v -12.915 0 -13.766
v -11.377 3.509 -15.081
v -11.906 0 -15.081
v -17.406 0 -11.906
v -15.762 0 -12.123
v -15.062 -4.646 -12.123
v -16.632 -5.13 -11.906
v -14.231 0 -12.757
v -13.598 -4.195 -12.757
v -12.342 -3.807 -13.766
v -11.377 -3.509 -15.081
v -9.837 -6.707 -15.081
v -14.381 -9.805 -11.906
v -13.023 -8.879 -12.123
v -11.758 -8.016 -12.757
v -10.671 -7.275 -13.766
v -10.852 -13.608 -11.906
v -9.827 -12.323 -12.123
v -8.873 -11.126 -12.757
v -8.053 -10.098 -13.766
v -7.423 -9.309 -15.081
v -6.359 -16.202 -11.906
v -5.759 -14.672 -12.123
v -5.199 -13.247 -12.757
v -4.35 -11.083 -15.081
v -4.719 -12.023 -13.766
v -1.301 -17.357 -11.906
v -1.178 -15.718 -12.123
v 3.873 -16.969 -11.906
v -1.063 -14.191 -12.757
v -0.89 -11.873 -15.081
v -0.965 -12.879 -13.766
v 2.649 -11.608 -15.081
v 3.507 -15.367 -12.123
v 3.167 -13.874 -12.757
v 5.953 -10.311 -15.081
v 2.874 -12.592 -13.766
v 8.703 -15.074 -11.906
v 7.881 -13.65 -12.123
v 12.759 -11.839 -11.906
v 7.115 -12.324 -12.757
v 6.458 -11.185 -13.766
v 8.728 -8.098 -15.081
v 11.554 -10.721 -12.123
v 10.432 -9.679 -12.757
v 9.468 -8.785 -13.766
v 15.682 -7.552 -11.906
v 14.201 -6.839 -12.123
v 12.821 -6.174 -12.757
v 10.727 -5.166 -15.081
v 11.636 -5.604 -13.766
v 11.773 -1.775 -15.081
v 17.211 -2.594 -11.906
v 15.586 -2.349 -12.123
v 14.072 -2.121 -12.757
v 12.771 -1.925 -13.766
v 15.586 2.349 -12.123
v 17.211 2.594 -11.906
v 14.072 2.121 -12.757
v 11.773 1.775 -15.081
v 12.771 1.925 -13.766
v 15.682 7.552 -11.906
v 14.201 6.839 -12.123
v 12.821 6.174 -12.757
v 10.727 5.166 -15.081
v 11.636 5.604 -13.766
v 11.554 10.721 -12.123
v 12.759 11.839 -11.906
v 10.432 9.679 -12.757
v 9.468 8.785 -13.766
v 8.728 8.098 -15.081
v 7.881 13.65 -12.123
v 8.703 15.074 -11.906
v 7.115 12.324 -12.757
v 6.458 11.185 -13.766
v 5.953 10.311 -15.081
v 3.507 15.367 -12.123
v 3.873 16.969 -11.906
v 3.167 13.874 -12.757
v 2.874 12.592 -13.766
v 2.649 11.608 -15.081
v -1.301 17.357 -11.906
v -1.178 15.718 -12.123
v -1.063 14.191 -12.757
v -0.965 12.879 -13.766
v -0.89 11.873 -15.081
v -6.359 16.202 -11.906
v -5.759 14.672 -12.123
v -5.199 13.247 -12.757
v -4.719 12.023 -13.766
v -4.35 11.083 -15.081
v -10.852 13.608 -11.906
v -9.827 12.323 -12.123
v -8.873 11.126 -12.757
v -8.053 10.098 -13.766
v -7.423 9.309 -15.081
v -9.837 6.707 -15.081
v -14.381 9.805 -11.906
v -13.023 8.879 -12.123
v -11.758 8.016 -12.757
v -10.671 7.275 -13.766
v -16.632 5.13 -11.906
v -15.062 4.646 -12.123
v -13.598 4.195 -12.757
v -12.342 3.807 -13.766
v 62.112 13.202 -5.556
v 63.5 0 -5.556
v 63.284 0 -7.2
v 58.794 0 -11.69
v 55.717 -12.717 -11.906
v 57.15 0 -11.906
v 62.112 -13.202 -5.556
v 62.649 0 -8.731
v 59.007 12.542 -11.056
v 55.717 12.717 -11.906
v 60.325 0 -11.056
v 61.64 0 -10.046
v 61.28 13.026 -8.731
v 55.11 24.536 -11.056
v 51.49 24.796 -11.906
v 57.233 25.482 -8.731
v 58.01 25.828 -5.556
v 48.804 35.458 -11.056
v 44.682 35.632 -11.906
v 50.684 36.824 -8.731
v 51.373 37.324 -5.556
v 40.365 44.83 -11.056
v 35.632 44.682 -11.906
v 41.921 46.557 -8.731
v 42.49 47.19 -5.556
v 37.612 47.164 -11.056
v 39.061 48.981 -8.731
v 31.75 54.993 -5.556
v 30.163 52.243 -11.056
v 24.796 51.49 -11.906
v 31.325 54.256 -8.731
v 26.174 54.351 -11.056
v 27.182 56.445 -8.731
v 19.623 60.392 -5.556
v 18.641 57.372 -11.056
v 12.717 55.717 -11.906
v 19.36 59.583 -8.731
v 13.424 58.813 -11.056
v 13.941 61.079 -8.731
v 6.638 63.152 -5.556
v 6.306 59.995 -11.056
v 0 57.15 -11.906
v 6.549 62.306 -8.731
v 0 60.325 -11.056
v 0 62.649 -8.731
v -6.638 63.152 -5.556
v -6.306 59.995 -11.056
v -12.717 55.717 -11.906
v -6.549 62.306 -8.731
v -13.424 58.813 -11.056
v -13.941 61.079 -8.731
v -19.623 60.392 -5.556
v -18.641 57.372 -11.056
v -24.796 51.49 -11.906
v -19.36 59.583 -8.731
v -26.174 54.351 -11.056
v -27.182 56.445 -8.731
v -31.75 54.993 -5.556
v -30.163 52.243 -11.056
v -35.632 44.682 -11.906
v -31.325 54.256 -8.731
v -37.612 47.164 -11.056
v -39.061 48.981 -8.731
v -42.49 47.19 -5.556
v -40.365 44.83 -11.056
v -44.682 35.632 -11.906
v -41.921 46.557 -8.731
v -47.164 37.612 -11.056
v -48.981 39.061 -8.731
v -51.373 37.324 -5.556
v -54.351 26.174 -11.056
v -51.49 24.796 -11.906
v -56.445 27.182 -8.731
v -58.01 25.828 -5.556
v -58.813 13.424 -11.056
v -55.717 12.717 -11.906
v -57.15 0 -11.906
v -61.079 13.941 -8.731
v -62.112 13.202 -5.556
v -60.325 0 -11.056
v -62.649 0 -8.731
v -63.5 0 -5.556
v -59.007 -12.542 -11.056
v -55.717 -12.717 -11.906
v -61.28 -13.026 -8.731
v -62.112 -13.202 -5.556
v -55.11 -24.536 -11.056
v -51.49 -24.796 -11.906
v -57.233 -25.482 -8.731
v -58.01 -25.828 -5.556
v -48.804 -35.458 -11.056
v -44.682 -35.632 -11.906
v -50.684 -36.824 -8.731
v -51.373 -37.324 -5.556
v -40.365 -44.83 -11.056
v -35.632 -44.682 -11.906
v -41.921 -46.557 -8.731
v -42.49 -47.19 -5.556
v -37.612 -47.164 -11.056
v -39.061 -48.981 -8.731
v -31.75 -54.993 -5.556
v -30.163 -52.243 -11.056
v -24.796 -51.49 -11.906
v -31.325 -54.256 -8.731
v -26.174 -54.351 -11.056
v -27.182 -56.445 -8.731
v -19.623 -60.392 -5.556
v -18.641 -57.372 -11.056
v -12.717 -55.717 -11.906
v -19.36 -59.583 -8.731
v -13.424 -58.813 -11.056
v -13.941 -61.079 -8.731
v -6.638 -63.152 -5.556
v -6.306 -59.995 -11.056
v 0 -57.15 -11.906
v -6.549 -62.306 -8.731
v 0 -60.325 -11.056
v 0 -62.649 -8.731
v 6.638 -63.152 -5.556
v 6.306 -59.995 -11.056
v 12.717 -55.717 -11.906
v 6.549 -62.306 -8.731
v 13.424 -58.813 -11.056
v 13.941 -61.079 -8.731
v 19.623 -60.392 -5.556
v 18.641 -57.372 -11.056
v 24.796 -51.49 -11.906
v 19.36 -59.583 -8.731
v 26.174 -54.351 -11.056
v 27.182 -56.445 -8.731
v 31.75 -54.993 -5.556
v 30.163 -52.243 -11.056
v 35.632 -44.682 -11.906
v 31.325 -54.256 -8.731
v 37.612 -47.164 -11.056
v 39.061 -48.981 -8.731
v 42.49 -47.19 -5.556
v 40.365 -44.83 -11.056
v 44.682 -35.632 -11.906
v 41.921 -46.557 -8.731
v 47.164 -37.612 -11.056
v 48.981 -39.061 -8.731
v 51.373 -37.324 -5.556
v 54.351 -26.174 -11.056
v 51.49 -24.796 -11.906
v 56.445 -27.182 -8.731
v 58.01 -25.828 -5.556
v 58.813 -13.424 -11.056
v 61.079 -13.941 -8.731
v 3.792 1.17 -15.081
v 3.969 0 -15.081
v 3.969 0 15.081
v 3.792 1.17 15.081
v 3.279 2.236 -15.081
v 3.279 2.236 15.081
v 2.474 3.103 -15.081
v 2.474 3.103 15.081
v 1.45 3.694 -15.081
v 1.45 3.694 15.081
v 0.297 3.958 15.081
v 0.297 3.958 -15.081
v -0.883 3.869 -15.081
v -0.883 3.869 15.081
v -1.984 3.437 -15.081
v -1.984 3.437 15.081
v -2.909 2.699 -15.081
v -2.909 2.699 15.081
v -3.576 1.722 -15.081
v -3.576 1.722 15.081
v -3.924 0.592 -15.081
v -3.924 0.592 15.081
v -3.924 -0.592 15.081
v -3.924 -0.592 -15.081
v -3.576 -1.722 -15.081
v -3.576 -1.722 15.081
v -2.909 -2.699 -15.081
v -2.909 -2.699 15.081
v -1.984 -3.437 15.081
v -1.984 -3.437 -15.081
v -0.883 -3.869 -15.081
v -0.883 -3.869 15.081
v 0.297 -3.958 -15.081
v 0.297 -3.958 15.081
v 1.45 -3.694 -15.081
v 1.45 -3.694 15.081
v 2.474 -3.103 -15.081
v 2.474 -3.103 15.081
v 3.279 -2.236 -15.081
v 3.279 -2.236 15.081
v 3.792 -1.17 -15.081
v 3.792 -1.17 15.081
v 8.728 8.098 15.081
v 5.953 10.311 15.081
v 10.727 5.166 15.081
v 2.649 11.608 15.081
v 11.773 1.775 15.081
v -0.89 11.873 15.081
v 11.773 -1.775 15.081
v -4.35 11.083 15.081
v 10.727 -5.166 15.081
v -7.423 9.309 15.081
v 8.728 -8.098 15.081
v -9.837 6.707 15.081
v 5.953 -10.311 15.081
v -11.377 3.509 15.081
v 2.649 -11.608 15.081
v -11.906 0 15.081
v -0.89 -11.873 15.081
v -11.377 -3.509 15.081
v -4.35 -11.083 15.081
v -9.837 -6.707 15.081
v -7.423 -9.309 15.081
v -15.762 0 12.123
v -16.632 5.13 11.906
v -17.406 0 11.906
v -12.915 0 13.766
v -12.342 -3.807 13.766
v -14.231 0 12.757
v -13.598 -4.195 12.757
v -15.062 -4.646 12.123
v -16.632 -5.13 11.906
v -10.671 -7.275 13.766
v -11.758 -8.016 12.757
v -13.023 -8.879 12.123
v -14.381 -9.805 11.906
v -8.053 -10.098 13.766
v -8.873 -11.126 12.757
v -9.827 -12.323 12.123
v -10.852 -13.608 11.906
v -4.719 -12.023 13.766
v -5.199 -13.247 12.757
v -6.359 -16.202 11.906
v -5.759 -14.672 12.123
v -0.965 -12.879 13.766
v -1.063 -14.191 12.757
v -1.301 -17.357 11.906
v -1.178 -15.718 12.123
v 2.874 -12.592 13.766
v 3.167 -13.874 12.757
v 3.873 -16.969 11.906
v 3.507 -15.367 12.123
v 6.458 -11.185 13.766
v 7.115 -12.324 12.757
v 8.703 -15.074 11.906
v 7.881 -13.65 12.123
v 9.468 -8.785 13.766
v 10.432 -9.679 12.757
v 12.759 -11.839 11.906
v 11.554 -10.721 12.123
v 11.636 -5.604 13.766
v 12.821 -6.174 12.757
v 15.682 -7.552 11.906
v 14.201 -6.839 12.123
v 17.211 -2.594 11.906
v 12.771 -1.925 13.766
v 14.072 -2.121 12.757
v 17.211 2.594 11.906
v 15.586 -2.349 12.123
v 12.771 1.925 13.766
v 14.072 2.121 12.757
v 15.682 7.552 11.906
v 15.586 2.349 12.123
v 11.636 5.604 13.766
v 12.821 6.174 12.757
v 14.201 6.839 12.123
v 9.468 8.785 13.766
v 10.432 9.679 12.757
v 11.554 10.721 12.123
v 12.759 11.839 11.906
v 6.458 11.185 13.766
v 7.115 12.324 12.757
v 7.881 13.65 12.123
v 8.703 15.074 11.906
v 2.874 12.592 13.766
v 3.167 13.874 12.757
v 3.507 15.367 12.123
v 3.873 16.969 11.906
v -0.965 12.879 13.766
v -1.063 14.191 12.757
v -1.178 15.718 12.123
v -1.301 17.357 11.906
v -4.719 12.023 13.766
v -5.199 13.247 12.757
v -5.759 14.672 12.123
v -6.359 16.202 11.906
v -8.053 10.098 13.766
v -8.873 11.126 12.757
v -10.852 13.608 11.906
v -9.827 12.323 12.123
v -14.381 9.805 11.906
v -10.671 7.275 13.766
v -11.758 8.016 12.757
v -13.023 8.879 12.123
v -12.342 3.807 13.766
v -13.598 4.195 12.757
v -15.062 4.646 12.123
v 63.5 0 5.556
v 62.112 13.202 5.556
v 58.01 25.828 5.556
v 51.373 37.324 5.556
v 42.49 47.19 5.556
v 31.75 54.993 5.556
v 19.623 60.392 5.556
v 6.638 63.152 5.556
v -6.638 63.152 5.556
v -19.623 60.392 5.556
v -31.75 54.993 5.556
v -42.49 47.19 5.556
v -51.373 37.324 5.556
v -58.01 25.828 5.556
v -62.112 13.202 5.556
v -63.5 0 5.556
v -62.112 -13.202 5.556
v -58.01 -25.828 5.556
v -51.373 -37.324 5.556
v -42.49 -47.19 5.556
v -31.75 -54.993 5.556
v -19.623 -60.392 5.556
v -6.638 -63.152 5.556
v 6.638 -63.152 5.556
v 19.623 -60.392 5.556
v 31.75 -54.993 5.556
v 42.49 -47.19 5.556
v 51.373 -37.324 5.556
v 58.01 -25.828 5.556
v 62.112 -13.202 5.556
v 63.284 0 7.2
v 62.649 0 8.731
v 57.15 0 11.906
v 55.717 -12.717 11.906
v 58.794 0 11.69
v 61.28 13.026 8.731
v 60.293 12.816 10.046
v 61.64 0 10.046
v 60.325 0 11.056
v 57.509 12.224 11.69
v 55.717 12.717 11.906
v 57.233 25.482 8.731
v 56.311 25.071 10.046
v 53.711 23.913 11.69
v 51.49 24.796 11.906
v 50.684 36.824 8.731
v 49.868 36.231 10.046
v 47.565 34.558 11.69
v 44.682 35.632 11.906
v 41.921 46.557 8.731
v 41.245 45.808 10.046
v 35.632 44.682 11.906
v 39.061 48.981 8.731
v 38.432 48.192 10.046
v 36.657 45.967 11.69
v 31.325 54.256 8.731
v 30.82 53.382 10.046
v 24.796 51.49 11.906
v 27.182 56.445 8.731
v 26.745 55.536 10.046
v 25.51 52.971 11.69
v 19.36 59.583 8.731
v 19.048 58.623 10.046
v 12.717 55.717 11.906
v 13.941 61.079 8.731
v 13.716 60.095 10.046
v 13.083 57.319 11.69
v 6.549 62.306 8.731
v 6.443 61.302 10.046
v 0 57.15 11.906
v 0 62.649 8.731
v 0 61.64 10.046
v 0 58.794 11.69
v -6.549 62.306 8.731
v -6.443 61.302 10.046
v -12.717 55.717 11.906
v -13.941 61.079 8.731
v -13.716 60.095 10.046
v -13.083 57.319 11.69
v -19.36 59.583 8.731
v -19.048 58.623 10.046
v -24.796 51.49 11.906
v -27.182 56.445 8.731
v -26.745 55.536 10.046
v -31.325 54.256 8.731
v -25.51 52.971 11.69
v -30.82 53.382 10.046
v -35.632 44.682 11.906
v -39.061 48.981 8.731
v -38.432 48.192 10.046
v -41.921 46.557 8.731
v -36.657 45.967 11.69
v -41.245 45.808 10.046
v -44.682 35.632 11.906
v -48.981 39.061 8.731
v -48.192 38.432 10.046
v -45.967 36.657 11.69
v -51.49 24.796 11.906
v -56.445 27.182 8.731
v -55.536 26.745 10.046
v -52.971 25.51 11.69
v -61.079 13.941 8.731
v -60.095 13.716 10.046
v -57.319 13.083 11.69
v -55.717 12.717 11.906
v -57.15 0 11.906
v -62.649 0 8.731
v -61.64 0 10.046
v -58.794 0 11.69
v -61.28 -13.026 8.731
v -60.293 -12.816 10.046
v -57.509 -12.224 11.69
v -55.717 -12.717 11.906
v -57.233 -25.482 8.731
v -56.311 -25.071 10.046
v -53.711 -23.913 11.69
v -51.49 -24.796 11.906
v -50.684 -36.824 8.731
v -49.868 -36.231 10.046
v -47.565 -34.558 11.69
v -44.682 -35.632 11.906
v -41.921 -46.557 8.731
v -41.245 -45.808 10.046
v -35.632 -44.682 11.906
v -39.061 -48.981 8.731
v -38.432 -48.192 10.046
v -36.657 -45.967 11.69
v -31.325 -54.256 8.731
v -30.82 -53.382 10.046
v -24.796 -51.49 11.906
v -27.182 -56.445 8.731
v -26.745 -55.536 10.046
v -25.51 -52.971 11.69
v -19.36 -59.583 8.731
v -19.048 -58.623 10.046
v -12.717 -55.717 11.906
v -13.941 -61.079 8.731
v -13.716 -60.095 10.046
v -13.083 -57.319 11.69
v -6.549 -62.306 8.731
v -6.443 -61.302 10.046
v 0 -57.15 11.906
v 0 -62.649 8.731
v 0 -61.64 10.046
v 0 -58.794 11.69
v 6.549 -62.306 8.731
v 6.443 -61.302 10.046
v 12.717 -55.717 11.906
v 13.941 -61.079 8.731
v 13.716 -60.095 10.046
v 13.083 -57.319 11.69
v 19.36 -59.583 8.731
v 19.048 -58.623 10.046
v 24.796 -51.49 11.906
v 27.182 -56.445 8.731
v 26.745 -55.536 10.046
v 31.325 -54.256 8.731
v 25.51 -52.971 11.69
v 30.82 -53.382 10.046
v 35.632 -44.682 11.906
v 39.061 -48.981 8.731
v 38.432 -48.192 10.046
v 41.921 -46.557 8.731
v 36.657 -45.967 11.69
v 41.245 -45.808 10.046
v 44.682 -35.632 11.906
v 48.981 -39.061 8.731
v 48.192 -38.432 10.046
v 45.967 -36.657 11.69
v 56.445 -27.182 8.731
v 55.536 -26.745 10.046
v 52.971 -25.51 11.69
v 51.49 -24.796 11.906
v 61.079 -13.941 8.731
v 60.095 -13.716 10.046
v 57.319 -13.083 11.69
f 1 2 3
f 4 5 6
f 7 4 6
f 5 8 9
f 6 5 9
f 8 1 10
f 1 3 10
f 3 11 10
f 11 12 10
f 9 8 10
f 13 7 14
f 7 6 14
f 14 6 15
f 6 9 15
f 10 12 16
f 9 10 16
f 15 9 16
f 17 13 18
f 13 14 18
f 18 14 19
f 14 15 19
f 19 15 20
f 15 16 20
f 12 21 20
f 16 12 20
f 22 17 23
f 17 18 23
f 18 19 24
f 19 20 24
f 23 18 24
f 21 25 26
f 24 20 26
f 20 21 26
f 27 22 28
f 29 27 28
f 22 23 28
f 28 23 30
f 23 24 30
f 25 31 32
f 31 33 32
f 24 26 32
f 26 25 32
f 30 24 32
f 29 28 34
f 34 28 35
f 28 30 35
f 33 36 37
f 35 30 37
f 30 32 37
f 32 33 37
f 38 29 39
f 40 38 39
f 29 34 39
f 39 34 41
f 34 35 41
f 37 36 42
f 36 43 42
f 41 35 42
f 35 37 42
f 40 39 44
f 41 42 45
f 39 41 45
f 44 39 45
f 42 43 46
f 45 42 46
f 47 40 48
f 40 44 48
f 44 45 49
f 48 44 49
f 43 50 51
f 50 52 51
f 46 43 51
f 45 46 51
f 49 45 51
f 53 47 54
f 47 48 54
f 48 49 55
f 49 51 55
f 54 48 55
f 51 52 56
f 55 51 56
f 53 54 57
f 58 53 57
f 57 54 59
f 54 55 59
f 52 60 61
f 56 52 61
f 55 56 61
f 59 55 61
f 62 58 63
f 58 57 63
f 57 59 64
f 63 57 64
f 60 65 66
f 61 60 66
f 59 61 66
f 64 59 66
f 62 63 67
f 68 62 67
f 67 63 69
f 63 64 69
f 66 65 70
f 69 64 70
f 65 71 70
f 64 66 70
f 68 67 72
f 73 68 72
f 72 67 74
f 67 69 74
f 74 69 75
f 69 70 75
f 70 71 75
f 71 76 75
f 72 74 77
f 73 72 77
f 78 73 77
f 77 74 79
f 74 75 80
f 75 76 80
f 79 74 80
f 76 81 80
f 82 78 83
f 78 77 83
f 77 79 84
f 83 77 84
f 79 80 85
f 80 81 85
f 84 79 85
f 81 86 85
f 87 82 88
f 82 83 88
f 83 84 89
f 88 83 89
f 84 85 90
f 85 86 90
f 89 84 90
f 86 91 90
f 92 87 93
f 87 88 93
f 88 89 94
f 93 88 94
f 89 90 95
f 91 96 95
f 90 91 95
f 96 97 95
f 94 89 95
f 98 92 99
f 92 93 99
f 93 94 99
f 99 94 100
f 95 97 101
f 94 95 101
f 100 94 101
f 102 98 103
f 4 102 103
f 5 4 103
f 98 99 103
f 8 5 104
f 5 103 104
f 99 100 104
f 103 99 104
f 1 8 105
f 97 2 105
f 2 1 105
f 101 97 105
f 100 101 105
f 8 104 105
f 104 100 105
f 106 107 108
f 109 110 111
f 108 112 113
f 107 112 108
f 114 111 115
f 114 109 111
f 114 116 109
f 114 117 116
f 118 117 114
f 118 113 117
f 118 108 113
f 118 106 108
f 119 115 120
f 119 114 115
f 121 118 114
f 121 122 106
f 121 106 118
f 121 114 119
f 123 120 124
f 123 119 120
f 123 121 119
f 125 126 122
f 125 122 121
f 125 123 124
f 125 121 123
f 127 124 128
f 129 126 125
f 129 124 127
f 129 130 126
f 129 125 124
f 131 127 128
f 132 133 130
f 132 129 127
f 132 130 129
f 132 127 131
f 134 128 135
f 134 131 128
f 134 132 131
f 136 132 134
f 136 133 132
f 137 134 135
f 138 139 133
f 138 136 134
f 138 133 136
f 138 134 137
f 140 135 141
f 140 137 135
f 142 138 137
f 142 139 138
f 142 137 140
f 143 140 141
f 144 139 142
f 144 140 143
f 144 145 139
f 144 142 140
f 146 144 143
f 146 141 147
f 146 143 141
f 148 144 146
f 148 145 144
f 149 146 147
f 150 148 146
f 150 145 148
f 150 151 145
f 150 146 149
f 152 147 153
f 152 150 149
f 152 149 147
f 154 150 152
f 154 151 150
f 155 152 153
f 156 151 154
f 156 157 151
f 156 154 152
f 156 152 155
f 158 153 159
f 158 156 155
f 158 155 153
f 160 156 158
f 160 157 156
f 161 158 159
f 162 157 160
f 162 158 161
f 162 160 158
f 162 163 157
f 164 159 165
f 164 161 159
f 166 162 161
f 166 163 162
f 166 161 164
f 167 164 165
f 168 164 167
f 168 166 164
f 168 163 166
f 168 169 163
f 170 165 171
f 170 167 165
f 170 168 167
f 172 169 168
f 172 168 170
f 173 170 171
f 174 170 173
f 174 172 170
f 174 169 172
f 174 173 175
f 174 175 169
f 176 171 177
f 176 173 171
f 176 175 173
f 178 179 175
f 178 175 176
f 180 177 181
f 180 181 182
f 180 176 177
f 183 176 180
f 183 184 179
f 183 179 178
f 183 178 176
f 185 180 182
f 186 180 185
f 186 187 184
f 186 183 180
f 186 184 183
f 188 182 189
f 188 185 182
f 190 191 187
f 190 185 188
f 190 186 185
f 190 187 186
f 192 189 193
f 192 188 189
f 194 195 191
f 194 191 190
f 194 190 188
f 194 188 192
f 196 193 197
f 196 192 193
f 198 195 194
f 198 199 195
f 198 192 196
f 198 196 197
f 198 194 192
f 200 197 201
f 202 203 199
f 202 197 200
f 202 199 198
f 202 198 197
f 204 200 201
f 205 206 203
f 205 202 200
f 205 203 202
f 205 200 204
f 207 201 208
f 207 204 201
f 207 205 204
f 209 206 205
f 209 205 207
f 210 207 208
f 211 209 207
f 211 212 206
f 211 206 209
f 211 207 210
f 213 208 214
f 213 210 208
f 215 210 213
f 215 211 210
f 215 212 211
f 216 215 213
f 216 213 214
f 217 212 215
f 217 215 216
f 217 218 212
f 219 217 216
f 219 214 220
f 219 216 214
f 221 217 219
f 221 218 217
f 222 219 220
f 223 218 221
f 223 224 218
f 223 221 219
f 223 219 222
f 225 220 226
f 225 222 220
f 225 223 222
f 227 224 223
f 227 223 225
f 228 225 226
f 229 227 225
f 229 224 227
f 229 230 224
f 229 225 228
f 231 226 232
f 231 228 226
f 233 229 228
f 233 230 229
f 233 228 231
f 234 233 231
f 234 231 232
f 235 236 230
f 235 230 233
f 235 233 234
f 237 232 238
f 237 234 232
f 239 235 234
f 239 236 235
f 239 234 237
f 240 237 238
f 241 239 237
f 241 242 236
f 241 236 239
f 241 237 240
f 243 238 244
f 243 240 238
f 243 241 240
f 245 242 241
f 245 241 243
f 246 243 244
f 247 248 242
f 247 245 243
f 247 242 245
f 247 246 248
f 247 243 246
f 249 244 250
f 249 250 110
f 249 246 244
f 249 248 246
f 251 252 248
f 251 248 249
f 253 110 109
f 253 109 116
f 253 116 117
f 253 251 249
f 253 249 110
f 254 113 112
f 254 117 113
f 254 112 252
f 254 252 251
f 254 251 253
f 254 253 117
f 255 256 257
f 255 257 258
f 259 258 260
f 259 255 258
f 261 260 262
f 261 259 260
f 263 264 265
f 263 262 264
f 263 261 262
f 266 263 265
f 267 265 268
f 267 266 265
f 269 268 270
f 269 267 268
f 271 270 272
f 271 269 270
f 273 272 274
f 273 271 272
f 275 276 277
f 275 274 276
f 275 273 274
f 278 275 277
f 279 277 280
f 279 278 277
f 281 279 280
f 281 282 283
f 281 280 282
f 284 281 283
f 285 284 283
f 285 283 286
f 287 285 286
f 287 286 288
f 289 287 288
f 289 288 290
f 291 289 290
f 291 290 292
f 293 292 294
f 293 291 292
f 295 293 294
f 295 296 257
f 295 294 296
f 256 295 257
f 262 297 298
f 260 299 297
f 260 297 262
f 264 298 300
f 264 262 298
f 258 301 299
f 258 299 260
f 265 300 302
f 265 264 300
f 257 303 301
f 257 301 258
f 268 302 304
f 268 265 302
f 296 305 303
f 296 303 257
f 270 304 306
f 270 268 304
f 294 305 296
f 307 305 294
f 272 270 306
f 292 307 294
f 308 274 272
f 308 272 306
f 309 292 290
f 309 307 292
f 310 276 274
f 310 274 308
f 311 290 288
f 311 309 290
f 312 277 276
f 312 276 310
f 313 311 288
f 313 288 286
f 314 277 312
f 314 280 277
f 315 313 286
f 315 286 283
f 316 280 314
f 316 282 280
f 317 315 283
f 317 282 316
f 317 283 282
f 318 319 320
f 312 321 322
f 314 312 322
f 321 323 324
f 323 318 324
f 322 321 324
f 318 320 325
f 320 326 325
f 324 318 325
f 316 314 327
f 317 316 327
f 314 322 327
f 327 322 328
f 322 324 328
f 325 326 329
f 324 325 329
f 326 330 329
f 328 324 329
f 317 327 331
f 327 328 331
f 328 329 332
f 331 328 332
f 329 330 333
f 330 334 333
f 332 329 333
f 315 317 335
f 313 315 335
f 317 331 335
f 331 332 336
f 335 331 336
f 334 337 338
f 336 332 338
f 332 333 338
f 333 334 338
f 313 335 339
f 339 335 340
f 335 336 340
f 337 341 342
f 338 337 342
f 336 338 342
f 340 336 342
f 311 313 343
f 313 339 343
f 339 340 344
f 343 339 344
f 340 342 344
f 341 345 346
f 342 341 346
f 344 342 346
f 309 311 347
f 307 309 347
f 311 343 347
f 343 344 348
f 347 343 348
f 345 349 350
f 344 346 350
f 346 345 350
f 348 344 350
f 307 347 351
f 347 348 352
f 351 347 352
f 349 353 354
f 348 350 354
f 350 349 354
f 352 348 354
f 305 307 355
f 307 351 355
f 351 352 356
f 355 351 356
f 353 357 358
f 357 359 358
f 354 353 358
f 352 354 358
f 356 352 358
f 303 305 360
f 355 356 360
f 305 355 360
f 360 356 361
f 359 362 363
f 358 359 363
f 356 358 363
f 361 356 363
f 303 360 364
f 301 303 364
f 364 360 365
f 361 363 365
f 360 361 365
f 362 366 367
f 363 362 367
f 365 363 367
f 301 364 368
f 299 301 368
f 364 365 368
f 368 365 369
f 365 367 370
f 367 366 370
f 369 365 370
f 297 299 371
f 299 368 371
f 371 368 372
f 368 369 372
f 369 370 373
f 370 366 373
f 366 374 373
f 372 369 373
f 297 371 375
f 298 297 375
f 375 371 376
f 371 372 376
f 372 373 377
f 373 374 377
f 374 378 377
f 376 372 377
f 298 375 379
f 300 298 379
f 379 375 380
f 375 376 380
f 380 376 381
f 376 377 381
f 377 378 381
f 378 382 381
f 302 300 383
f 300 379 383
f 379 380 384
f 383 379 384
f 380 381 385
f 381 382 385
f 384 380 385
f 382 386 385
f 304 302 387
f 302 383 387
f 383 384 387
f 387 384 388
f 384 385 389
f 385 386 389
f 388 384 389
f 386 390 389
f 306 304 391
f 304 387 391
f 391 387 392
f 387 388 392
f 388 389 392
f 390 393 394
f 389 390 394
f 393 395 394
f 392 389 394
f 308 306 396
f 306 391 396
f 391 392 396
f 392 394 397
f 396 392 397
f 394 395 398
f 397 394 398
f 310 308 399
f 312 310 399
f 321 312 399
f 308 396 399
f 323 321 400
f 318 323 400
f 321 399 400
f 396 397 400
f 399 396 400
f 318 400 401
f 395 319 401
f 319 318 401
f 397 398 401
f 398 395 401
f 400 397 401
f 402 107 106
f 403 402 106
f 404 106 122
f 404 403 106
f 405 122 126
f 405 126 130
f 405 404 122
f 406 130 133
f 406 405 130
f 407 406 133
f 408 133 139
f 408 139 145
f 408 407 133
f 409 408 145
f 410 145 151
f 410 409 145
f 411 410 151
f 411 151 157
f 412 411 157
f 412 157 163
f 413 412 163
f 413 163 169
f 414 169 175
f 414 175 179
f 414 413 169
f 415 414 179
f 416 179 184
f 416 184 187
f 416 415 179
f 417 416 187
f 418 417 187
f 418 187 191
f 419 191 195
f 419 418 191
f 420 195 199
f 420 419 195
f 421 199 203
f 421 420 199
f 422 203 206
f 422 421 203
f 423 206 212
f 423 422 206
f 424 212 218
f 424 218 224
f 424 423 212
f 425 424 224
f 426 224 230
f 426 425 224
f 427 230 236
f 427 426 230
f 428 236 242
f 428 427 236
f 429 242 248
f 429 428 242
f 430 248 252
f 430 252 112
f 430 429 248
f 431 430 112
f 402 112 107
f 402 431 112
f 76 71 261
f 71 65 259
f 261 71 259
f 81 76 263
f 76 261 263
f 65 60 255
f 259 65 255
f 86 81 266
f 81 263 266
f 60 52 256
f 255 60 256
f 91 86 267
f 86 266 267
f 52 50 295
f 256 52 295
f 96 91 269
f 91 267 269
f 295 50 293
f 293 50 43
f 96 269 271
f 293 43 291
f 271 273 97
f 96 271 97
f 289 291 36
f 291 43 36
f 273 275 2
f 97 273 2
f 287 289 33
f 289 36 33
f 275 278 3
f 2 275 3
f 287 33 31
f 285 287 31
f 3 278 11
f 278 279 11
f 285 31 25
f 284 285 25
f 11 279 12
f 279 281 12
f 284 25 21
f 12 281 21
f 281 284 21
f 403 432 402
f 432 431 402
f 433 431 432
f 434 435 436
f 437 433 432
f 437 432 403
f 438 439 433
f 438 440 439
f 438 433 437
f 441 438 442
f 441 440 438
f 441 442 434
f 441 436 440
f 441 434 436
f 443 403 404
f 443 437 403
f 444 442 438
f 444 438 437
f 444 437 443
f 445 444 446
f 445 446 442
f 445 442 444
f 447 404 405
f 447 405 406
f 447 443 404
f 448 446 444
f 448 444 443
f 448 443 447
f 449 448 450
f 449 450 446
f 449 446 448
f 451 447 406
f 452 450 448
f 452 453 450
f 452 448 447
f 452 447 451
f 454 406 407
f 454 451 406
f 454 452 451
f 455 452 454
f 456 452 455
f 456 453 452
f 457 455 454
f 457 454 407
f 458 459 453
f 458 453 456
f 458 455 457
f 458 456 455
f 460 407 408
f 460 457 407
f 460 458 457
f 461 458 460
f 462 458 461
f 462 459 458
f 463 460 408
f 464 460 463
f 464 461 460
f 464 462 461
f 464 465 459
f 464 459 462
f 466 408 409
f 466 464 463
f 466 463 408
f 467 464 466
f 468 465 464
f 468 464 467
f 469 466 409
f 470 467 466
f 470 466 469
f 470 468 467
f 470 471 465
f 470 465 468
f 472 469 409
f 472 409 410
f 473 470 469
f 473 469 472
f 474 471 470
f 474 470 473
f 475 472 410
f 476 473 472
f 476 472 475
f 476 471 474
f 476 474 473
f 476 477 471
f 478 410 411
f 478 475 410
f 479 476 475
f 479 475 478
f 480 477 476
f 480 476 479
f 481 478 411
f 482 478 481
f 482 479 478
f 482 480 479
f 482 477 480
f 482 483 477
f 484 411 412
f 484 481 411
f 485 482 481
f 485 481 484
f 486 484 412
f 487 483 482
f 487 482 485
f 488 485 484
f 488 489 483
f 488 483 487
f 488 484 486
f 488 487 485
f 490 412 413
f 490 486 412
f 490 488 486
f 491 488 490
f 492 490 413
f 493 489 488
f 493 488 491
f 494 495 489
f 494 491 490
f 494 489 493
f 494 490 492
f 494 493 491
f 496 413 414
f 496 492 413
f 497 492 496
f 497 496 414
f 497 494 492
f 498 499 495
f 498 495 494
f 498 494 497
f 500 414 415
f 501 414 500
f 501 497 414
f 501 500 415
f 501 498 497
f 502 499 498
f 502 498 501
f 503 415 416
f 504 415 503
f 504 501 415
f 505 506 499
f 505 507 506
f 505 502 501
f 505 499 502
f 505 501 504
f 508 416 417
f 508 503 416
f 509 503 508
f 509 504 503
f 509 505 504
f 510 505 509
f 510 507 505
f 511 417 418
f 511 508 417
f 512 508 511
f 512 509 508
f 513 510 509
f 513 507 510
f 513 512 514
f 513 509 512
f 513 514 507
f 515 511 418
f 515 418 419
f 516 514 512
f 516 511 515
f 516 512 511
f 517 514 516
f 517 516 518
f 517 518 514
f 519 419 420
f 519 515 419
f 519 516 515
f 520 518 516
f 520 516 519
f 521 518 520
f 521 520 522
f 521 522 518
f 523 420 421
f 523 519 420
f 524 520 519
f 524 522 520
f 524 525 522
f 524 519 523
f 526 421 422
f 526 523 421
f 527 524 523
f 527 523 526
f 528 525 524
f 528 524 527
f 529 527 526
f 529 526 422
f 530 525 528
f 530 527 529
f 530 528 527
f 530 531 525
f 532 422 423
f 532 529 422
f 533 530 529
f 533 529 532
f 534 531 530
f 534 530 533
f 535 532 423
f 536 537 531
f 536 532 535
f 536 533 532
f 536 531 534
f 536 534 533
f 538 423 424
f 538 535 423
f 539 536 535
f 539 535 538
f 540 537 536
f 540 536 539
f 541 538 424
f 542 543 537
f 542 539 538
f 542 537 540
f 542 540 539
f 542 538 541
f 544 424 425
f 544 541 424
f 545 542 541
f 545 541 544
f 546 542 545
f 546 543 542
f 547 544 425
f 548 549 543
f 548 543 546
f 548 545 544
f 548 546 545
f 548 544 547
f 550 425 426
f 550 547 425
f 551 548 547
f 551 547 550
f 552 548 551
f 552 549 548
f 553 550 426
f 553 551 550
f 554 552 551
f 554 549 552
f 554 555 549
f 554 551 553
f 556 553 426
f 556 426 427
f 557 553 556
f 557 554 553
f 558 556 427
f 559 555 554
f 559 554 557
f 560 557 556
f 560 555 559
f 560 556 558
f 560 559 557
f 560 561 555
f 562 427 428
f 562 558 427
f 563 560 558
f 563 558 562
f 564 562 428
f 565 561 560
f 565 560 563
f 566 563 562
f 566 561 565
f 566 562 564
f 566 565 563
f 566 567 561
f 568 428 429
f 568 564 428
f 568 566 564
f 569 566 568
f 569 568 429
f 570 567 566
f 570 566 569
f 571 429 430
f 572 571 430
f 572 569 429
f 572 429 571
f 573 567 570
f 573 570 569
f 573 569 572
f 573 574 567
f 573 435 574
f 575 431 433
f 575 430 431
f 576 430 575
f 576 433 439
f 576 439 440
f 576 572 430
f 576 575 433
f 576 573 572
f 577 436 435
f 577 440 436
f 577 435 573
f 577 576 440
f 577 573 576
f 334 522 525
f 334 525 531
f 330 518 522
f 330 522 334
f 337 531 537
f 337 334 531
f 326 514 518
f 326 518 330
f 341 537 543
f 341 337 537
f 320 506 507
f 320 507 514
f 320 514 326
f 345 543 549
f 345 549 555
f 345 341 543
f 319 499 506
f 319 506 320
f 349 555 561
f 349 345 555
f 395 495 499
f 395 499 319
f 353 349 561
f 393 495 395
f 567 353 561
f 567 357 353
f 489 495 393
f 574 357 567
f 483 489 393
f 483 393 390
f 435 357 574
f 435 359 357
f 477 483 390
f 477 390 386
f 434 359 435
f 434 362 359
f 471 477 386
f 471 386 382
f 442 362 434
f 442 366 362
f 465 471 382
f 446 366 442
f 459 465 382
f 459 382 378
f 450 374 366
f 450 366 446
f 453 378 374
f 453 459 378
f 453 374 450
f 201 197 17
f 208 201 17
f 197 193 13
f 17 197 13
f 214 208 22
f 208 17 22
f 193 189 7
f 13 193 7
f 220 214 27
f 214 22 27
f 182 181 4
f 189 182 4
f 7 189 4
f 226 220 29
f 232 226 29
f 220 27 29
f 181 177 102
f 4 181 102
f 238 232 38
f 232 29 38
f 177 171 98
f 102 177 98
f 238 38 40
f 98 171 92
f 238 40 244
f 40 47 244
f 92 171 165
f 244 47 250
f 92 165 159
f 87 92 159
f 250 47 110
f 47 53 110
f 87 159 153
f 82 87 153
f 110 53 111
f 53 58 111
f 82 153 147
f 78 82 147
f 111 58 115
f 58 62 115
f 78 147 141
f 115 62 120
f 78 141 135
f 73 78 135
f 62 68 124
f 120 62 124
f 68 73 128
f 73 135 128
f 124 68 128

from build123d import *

# Parameters (mm, degrees)
SKETCH1_R               = 63.5
BOSS_EXTRUDE1_DEPTH     = 11.90625
SKETCH2_R               = 11.90625
BOSS_EXTRUDE2_DEPTH     = 15.08125
CUT_EXTRUDE1_DEPTH      = 92.060112572
CUT_EXTRUDE1_DEPTH_BACK = 92.060112572
SKETCH3_R               = 3.96875
FILLET1_R               = 6.35


with BuildPart() as part:
    # Sketch1 → Boss-Extrude1 (new, symmetric)
    with BuildSketch(Plane.XY):
        Circle(SKETCH1_R)
    extrude(amount=BOSS_EXTRUDE1_DEPTH, both=True)

    # Sketch2 → Boss-Extrude2 (add, symmetric)
    with BuildSketch(Plane.XY):
        with Locations(Location((0, 0, 0), (0, 0, 180))):
            Circle(SKETCH2_R)
    extrude(amount=BOSS_EXTRUDE2_DEPTH, both=True)

    # Sketch3 → Cut-Extrude1 (cut, two sides: drawn at the far end of the back side and taken through both)
    with BuildSketch(Plane.XY.offset(-CUT_EXTRUDE1_DEPTH_BACK)):
        Circle(SKETCH3_R)
    extrude(amount=CUT_EXTRUDE1_DEPTH + CUT_EXTRUDE1_DEPTH_BACK, mode=Mode.SUBTRACT)

    # Fillet1
    # the kernel refuses this fillet: 6.35 mm, written as the material it adds along each edge
    with BuildSketch(Plane(origin=(0, 0, -11.90625), x_dir=(-1, 0, 0), z_dir=(0, 1, 0))) as fillet1_piece_1:
        with BuildLine():
            CenterArc((17.405511314, -6.35), FILLET1_R, 90, 60)
            Line((17.405511314, 0), (11.90625, 0))
            Line((11.90625, 0), (11.90625, -3.175))
        make_face()
    revolve(axis=Axis((0, 0, -11.90625), (0, 0, 1)))
    with BuildSketch(Plane(origin=(0, 0, 11.90625), x_dir=(-1, 0, 0), z_dir=(0, 1, 0))) as fillet1_piece_2:
        with BuildLine():
            CenterArc((17.405511314, 6.35), FILLET1_R, 210, 60)
            Line((11.90625, 3.175), (11.90625, 0))
            Line((11.90625, 0), (17.405511314, 0))
        make_face()
    revolve(axis=Axis((0, 0, 11.90625), (0, 0, 1)))
    # the kernel refuses this fillet: 6.35 mm, written as the material it takes off along each edge
    with BuildSketch(Plane(origin=(0, 0, -11.90625), x_dir=(1, 0, 0), z_dir=(0, -1, 0))) as fillet1_2_piece_1:
        with BuildLine():
            CenterArc((63.5 - FILLET1_R, FILLET1_R), FILLET1_R, 270, 90)
            Line((63.5 - FILLET1_R, 0), (63.5, 0))
            Line((63.5, 0), (63.5, FILLET1_R))
        make_face()
    revolve(axis=Axis((0, 0, -11.90625), (0, 0, 1)), mode=Mode.SUBTRACT)
    with BuildSketch(Plane(origin=(0, 0, 11.90625), x_dir=(1, 0, 0), z_dir=(0, -1, 0))) as fillet1_2_piece_2:
        with BuildLine():
            CenterArc((63.5 - FILLET1_R, -FILLET1_R), FILLET1_R, 0, 90)
            Line((63.5 - FILLET1_R, 0), (63.5, 0))
            Line((63.5, 0), (63.5, -FILLET1_R))
        make_face()
    revolve(axis=Axis((0, 0, 11.90625), (0, 0, 1)), mode=Mode.SUBTRACT)


solid = part.part
